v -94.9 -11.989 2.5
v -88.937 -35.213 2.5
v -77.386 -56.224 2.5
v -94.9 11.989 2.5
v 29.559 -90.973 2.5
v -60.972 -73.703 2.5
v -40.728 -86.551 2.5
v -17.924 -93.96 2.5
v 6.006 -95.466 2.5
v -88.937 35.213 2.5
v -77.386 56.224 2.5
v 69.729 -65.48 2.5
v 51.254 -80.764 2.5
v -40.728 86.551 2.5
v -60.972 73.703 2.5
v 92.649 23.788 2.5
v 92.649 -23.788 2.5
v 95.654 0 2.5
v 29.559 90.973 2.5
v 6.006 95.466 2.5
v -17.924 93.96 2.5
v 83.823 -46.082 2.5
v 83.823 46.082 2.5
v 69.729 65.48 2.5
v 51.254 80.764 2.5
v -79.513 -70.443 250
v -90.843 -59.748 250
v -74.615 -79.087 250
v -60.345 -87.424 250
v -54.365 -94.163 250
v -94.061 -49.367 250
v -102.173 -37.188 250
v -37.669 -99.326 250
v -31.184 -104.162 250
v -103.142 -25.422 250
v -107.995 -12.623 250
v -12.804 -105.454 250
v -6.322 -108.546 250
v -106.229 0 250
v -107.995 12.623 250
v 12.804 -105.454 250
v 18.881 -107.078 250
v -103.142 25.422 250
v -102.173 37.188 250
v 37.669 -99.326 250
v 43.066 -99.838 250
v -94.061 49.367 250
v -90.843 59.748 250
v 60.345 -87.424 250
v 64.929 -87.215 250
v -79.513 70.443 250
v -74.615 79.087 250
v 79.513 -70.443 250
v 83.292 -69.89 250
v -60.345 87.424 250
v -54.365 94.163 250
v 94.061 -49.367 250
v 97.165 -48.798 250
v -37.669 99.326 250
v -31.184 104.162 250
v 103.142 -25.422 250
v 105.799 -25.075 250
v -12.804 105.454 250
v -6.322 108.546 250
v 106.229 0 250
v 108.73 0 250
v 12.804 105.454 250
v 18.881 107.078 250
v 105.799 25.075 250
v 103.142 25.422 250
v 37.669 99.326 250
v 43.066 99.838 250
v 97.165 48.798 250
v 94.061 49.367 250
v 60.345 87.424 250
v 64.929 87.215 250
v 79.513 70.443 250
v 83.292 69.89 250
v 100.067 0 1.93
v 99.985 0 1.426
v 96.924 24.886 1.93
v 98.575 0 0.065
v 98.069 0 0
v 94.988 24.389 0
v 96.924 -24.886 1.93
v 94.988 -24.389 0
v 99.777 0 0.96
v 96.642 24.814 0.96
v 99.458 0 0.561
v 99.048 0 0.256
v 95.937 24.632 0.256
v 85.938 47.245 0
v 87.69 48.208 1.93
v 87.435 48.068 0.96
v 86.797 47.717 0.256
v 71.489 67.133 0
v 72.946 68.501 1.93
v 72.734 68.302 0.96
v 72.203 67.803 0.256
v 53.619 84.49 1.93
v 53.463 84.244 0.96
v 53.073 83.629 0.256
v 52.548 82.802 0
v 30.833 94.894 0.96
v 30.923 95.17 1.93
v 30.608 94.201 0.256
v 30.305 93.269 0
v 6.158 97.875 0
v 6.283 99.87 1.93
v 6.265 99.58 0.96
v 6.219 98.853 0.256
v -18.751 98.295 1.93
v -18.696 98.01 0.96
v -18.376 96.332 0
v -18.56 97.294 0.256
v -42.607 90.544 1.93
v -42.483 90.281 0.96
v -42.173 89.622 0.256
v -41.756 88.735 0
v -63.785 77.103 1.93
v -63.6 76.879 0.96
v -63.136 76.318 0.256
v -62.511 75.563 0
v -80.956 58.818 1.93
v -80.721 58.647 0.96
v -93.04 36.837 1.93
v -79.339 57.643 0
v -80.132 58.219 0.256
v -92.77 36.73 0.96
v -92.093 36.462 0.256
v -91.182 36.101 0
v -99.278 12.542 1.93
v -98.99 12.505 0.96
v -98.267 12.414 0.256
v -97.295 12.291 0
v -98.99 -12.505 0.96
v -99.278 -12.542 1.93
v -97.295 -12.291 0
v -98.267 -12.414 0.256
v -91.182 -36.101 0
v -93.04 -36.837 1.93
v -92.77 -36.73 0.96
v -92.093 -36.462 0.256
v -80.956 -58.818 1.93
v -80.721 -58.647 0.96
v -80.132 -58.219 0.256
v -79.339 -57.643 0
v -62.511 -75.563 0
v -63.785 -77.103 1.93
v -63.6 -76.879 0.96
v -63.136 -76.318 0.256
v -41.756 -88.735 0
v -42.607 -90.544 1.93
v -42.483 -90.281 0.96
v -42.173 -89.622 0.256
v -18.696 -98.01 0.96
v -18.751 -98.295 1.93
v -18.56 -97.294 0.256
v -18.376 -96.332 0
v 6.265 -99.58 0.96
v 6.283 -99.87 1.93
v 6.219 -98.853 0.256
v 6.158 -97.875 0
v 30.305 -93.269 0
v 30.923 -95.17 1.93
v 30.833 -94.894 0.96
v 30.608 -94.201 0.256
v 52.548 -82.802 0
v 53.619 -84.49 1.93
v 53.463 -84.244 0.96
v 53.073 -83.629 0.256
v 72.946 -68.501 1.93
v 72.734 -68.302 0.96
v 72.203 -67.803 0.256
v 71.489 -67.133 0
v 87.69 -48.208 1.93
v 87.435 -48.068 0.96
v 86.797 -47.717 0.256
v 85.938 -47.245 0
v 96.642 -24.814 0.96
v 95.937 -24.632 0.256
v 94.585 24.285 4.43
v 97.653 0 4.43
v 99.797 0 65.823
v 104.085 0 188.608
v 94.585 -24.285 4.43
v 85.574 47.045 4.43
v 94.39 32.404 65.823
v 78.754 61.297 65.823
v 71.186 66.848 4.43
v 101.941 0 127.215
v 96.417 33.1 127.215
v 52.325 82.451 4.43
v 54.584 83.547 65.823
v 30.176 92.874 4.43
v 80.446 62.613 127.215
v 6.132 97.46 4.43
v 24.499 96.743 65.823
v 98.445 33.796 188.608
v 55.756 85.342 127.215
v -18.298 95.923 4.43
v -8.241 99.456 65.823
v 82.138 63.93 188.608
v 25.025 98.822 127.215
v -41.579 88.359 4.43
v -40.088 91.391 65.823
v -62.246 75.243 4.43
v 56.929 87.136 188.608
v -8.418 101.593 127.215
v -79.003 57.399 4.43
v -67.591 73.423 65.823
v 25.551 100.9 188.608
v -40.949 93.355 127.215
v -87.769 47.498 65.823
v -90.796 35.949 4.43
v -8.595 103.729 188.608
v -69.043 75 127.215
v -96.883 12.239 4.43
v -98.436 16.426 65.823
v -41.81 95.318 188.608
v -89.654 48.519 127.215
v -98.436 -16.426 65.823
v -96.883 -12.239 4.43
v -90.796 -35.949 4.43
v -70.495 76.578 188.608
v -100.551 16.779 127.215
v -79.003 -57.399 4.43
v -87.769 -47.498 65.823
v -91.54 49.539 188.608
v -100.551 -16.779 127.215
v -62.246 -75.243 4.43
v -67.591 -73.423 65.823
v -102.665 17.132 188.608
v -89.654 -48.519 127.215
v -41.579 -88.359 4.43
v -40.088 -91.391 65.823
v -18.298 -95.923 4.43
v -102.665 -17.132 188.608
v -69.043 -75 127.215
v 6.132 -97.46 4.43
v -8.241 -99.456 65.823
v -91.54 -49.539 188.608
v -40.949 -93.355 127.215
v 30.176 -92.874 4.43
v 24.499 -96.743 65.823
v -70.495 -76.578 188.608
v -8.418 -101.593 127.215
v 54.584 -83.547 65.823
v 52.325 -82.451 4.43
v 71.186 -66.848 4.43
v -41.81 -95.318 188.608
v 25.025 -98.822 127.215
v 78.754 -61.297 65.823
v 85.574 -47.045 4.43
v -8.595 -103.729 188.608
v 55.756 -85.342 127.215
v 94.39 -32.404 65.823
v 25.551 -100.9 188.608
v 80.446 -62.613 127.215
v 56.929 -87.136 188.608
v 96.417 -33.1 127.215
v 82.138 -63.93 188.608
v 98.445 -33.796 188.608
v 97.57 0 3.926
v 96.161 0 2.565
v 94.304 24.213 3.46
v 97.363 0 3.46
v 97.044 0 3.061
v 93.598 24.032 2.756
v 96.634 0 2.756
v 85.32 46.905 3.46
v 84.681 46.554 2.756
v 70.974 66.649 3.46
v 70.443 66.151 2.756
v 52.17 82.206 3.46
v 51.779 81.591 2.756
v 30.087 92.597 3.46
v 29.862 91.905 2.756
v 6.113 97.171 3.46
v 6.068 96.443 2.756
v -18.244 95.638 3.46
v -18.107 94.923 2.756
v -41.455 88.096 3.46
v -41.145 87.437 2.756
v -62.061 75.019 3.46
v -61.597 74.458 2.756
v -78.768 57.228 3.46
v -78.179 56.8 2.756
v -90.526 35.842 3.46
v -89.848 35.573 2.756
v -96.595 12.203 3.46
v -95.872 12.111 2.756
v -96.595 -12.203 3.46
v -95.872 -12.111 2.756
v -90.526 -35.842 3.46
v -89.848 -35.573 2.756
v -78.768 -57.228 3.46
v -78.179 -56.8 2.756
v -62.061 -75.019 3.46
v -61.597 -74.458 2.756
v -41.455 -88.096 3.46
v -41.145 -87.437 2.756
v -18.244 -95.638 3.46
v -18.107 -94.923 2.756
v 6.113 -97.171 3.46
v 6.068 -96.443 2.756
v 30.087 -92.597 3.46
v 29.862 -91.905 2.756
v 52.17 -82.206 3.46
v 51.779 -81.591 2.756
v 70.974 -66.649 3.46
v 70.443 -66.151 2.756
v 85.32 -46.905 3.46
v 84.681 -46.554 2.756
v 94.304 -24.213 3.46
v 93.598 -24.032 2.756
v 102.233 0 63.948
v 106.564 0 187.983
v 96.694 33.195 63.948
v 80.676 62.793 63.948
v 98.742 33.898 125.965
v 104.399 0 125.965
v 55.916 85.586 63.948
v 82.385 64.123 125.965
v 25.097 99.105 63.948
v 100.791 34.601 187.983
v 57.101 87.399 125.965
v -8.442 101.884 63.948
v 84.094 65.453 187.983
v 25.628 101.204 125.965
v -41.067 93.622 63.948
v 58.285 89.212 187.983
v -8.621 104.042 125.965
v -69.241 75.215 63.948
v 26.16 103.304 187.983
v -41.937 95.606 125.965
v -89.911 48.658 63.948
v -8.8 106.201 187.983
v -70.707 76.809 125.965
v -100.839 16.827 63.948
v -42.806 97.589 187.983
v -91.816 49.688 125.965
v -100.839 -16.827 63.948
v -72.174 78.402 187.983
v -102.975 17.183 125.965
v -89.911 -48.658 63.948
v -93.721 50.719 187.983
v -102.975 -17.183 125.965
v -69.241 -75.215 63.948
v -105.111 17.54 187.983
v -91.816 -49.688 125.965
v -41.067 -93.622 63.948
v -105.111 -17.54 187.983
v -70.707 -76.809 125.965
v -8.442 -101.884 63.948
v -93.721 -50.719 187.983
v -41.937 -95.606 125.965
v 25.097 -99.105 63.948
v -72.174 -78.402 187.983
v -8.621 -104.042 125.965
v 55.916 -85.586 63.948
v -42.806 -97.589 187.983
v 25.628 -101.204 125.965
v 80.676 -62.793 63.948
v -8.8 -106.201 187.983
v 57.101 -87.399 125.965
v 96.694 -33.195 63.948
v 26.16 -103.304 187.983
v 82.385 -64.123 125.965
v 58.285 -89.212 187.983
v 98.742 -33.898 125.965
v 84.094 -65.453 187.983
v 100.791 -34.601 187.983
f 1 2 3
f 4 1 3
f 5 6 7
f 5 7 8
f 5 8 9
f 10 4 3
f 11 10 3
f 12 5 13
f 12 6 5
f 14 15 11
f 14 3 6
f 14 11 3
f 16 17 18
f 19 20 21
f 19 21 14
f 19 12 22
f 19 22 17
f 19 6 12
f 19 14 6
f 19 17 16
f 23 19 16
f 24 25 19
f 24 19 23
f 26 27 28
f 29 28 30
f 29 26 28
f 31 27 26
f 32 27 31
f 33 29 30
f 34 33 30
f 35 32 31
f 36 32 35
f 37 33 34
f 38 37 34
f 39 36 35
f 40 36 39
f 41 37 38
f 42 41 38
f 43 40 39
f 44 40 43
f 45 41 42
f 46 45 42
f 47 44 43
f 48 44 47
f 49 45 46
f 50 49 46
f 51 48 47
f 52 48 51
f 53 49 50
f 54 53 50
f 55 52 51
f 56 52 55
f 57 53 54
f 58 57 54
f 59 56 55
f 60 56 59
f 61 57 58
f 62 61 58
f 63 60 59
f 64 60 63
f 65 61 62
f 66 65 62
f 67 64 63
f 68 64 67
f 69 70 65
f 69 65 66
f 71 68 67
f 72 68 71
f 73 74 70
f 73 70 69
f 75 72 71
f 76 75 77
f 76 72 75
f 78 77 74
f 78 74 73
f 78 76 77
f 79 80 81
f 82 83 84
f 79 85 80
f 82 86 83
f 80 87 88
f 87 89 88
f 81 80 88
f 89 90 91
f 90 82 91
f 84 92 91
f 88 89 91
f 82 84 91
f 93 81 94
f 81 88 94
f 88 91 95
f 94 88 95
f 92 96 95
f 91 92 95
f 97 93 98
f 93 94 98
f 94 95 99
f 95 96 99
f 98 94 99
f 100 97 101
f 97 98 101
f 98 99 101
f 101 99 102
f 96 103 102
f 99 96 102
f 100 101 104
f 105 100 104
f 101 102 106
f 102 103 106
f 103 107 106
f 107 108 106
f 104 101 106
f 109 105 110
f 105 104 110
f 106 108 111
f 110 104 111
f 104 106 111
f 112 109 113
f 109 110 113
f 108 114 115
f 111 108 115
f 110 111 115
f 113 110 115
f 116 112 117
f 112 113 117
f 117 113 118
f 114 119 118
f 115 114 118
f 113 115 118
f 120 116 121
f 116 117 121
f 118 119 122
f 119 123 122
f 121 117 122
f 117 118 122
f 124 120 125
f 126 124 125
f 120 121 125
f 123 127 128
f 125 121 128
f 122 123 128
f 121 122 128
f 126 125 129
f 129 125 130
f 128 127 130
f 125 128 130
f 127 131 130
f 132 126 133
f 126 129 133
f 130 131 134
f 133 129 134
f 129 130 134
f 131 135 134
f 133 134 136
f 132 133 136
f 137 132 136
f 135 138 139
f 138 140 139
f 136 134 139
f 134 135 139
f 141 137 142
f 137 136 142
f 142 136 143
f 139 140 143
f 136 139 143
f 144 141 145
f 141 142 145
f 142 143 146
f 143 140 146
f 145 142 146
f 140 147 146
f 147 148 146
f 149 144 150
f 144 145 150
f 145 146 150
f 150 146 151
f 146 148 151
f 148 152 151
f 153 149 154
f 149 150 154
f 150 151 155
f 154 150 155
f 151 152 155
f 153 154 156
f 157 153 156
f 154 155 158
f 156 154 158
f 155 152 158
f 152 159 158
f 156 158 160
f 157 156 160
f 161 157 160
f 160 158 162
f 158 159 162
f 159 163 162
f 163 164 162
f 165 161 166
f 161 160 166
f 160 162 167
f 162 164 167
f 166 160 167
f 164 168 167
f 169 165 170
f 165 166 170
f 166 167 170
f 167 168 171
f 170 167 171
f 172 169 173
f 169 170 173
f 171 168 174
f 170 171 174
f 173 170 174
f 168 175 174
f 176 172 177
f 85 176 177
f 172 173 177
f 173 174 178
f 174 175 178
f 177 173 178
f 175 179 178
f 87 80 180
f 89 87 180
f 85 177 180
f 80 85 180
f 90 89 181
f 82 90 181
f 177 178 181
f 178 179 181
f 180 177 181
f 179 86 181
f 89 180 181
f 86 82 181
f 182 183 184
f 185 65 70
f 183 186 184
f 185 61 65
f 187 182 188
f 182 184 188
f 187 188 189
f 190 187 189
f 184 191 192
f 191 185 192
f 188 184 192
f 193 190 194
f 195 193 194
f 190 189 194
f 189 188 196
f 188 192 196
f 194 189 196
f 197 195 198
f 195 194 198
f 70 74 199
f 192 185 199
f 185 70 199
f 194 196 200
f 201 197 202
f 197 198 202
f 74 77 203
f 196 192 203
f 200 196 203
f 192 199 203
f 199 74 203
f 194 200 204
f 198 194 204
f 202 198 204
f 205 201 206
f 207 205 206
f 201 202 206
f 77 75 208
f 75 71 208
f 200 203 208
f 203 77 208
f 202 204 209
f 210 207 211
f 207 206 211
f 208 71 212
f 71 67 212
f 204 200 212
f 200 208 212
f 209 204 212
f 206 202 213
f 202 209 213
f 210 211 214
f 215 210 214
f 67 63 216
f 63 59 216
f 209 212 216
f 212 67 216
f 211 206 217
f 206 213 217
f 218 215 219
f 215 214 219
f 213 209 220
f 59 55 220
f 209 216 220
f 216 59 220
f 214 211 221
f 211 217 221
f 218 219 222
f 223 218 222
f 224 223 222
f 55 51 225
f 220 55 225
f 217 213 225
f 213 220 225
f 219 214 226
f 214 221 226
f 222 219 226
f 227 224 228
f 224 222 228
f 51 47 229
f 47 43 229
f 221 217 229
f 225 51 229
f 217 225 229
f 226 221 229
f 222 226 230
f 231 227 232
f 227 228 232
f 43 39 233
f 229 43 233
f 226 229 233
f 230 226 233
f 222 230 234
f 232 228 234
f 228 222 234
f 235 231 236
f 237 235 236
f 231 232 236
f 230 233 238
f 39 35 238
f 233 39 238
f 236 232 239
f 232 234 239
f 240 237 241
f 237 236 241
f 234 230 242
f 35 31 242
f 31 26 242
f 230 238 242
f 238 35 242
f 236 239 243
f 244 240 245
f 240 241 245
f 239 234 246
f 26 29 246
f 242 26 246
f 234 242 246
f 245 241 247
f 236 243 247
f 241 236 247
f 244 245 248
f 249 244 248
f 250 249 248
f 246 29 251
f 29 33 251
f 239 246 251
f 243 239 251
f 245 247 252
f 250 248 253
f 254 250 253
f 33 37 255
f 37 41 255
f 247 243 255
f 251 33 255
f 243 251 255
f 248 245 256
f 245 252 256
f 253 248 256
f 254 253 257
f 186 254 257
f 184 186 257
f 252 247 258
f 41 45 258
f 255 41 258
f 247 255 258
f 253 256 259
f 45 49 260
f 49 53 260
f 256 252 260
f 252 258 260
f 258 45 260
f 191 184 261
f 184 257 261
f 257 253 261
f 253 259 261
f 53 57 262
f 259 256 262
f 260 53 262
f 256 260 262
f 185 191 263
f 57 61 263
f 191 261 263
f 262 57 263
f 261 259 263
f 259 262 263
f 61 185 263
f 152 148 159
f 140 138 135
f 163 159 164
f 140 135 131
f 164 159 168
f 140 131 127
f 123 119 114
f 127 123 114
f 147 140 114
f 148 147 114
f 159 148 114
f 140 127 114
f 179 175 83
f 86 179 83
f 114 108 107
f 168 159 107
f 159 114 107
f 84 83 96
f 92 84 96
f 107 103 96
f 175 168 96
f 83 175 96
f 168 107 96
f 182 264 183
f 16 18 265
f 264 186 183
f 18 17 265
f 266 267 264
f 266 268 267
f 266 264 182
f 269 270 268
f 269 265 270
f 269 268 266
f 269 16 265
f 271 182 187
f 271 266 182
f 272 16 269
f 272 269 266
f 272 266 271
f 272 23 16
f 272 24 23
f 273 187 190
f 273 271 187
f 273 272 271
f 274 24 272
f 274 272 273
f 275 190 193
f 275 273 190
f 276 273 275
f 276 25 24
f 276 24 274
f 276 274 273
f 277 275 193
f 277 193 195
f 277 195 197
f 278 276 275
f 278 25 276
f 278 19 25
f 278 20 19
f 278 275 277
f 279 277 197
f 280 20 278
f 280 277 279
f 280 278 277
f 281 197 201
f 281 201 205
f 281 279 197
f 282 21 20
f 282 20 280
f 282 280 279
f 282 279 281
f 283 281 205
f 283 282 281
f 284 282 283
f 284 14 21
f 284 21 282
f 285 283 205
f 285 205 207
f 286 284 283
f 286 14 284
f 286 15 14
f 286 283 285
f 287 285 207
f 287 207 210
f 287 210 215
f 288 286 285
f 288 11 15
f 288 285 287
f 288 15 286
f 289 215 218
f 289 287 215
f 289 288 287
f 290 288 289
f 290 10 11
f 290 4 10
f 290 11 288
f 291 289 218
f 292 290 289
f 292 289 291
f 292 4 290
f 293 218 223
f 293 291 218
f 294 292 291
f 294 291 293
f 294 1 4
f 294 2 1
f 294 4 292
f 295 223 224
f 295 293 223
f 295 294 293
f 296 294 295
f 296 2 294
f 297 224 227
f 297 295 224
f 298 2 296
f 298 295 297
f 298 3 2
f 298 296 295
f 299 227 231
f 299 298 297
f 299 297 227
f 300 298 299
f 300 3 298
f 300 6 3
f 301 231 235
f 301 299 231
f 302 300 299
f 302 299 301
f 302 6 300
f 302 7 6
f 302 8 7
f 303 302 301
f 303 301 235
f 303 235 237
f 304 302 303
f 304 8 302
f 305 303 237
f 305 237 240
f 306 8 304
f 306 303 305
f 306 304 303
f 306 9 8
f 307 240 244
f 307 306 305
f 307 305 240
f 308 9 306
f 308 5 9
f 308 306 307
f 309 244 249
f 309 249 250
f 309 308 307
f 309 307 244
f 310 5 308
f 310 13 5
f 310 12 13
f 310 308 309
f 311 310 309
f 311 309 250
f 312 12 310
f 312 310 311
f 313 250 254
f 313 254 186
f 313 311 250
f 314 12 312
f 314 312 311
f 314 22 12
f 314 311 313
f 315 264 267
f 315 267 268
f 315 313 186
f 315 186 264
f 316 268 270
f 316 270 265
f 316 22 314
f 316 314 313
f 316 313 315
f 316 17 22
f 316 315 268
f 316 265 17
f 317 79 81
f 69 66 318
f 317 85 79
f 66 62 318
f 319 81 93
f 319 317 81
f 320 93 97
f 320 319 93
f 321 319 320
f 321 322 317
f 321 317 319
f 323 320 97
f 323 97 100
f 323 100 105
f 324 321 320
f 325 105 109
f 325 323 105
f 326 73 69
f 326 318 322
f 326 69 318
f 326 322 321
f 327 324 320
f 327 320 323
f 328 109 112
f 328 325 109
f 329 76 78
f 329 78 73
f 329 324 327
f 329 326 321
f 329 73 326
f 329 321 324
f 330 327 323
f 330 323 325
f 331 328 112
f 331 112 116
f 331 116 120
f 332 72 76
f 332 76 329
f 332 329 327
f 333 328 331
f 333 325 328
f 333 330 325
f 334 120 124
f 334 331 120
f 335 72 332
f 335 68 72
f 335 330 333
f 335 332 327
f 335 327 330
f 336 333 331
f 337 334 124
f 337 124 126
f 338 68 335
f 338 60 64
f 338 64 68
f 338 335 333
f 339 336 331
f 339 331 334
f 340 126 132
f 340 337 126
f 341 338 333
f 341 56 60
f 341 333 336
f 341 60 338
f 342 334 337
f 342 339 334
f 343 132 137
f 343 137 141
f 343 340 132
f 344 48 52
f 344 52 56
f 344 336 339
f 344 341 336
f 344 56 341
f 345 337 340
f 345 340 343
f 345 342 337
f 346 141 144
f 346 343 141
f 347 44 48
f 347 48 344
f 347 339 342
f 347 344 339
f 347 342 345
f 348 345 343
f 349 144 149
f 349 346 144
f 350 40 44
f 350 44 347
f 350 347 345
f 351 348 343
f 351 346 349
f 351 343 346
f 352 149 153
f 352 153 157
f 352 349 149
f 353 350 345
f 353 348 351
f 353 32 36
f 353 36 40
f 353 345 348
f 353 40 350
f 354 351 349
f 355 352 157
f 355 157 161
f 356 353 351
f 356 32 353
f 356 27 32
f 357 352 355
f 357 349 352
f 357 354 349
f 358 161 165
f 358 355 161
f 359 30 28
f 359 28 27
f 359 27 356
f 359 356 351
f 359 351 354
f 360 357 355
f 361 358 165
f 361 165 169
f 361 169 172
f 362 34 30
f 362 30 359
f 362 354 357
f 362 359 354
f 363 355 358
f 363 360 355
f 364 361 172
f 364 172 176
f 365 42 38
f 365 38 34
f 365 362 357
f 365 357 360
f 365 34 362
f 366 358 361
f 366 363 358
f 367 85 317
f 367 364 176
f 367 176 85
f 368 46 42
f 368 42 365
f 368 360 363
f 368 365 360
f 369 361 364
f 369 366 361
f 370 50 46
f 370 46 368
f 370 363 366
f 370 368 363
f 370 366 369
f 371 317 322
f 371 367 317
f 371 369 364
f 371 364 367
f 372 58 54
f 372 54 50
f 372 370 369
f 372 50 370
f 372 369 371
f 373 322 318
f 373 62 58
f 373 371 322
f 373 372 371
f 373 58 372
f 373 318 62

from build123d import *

# Parameters (mm, degrees)
F0_R     = 100
F1_DEPTH = 250
F1_TAPER = -2
F2_T     = -2.5
F3_R     = 2


with BuildPart() as f1:
    # F0 (on Top) → F1 (new body)
    with BuildSketch(Plane.XY):
        Circle(F0_R)
    extrude(amount=F1_DEPTH, taper=F1_TAPER)

    # F2
    f2_openings = [f1.faces().sort_by_distance(p)[0] for p in [
        (0, 0, 250),
    ]]
    offset(amount=F2_T, openings=f2_openings, kind=Kind.INTERSECTION)

    # F3
    f3_edges = [f1.edges().sort_by_distance(p)[0] for p in [
        (-100, 0, 0),
        (-97.585778, 0, 2.5),
    ]]
    fillet(f3_edges, radius=F3_R)


solid = f1.part
